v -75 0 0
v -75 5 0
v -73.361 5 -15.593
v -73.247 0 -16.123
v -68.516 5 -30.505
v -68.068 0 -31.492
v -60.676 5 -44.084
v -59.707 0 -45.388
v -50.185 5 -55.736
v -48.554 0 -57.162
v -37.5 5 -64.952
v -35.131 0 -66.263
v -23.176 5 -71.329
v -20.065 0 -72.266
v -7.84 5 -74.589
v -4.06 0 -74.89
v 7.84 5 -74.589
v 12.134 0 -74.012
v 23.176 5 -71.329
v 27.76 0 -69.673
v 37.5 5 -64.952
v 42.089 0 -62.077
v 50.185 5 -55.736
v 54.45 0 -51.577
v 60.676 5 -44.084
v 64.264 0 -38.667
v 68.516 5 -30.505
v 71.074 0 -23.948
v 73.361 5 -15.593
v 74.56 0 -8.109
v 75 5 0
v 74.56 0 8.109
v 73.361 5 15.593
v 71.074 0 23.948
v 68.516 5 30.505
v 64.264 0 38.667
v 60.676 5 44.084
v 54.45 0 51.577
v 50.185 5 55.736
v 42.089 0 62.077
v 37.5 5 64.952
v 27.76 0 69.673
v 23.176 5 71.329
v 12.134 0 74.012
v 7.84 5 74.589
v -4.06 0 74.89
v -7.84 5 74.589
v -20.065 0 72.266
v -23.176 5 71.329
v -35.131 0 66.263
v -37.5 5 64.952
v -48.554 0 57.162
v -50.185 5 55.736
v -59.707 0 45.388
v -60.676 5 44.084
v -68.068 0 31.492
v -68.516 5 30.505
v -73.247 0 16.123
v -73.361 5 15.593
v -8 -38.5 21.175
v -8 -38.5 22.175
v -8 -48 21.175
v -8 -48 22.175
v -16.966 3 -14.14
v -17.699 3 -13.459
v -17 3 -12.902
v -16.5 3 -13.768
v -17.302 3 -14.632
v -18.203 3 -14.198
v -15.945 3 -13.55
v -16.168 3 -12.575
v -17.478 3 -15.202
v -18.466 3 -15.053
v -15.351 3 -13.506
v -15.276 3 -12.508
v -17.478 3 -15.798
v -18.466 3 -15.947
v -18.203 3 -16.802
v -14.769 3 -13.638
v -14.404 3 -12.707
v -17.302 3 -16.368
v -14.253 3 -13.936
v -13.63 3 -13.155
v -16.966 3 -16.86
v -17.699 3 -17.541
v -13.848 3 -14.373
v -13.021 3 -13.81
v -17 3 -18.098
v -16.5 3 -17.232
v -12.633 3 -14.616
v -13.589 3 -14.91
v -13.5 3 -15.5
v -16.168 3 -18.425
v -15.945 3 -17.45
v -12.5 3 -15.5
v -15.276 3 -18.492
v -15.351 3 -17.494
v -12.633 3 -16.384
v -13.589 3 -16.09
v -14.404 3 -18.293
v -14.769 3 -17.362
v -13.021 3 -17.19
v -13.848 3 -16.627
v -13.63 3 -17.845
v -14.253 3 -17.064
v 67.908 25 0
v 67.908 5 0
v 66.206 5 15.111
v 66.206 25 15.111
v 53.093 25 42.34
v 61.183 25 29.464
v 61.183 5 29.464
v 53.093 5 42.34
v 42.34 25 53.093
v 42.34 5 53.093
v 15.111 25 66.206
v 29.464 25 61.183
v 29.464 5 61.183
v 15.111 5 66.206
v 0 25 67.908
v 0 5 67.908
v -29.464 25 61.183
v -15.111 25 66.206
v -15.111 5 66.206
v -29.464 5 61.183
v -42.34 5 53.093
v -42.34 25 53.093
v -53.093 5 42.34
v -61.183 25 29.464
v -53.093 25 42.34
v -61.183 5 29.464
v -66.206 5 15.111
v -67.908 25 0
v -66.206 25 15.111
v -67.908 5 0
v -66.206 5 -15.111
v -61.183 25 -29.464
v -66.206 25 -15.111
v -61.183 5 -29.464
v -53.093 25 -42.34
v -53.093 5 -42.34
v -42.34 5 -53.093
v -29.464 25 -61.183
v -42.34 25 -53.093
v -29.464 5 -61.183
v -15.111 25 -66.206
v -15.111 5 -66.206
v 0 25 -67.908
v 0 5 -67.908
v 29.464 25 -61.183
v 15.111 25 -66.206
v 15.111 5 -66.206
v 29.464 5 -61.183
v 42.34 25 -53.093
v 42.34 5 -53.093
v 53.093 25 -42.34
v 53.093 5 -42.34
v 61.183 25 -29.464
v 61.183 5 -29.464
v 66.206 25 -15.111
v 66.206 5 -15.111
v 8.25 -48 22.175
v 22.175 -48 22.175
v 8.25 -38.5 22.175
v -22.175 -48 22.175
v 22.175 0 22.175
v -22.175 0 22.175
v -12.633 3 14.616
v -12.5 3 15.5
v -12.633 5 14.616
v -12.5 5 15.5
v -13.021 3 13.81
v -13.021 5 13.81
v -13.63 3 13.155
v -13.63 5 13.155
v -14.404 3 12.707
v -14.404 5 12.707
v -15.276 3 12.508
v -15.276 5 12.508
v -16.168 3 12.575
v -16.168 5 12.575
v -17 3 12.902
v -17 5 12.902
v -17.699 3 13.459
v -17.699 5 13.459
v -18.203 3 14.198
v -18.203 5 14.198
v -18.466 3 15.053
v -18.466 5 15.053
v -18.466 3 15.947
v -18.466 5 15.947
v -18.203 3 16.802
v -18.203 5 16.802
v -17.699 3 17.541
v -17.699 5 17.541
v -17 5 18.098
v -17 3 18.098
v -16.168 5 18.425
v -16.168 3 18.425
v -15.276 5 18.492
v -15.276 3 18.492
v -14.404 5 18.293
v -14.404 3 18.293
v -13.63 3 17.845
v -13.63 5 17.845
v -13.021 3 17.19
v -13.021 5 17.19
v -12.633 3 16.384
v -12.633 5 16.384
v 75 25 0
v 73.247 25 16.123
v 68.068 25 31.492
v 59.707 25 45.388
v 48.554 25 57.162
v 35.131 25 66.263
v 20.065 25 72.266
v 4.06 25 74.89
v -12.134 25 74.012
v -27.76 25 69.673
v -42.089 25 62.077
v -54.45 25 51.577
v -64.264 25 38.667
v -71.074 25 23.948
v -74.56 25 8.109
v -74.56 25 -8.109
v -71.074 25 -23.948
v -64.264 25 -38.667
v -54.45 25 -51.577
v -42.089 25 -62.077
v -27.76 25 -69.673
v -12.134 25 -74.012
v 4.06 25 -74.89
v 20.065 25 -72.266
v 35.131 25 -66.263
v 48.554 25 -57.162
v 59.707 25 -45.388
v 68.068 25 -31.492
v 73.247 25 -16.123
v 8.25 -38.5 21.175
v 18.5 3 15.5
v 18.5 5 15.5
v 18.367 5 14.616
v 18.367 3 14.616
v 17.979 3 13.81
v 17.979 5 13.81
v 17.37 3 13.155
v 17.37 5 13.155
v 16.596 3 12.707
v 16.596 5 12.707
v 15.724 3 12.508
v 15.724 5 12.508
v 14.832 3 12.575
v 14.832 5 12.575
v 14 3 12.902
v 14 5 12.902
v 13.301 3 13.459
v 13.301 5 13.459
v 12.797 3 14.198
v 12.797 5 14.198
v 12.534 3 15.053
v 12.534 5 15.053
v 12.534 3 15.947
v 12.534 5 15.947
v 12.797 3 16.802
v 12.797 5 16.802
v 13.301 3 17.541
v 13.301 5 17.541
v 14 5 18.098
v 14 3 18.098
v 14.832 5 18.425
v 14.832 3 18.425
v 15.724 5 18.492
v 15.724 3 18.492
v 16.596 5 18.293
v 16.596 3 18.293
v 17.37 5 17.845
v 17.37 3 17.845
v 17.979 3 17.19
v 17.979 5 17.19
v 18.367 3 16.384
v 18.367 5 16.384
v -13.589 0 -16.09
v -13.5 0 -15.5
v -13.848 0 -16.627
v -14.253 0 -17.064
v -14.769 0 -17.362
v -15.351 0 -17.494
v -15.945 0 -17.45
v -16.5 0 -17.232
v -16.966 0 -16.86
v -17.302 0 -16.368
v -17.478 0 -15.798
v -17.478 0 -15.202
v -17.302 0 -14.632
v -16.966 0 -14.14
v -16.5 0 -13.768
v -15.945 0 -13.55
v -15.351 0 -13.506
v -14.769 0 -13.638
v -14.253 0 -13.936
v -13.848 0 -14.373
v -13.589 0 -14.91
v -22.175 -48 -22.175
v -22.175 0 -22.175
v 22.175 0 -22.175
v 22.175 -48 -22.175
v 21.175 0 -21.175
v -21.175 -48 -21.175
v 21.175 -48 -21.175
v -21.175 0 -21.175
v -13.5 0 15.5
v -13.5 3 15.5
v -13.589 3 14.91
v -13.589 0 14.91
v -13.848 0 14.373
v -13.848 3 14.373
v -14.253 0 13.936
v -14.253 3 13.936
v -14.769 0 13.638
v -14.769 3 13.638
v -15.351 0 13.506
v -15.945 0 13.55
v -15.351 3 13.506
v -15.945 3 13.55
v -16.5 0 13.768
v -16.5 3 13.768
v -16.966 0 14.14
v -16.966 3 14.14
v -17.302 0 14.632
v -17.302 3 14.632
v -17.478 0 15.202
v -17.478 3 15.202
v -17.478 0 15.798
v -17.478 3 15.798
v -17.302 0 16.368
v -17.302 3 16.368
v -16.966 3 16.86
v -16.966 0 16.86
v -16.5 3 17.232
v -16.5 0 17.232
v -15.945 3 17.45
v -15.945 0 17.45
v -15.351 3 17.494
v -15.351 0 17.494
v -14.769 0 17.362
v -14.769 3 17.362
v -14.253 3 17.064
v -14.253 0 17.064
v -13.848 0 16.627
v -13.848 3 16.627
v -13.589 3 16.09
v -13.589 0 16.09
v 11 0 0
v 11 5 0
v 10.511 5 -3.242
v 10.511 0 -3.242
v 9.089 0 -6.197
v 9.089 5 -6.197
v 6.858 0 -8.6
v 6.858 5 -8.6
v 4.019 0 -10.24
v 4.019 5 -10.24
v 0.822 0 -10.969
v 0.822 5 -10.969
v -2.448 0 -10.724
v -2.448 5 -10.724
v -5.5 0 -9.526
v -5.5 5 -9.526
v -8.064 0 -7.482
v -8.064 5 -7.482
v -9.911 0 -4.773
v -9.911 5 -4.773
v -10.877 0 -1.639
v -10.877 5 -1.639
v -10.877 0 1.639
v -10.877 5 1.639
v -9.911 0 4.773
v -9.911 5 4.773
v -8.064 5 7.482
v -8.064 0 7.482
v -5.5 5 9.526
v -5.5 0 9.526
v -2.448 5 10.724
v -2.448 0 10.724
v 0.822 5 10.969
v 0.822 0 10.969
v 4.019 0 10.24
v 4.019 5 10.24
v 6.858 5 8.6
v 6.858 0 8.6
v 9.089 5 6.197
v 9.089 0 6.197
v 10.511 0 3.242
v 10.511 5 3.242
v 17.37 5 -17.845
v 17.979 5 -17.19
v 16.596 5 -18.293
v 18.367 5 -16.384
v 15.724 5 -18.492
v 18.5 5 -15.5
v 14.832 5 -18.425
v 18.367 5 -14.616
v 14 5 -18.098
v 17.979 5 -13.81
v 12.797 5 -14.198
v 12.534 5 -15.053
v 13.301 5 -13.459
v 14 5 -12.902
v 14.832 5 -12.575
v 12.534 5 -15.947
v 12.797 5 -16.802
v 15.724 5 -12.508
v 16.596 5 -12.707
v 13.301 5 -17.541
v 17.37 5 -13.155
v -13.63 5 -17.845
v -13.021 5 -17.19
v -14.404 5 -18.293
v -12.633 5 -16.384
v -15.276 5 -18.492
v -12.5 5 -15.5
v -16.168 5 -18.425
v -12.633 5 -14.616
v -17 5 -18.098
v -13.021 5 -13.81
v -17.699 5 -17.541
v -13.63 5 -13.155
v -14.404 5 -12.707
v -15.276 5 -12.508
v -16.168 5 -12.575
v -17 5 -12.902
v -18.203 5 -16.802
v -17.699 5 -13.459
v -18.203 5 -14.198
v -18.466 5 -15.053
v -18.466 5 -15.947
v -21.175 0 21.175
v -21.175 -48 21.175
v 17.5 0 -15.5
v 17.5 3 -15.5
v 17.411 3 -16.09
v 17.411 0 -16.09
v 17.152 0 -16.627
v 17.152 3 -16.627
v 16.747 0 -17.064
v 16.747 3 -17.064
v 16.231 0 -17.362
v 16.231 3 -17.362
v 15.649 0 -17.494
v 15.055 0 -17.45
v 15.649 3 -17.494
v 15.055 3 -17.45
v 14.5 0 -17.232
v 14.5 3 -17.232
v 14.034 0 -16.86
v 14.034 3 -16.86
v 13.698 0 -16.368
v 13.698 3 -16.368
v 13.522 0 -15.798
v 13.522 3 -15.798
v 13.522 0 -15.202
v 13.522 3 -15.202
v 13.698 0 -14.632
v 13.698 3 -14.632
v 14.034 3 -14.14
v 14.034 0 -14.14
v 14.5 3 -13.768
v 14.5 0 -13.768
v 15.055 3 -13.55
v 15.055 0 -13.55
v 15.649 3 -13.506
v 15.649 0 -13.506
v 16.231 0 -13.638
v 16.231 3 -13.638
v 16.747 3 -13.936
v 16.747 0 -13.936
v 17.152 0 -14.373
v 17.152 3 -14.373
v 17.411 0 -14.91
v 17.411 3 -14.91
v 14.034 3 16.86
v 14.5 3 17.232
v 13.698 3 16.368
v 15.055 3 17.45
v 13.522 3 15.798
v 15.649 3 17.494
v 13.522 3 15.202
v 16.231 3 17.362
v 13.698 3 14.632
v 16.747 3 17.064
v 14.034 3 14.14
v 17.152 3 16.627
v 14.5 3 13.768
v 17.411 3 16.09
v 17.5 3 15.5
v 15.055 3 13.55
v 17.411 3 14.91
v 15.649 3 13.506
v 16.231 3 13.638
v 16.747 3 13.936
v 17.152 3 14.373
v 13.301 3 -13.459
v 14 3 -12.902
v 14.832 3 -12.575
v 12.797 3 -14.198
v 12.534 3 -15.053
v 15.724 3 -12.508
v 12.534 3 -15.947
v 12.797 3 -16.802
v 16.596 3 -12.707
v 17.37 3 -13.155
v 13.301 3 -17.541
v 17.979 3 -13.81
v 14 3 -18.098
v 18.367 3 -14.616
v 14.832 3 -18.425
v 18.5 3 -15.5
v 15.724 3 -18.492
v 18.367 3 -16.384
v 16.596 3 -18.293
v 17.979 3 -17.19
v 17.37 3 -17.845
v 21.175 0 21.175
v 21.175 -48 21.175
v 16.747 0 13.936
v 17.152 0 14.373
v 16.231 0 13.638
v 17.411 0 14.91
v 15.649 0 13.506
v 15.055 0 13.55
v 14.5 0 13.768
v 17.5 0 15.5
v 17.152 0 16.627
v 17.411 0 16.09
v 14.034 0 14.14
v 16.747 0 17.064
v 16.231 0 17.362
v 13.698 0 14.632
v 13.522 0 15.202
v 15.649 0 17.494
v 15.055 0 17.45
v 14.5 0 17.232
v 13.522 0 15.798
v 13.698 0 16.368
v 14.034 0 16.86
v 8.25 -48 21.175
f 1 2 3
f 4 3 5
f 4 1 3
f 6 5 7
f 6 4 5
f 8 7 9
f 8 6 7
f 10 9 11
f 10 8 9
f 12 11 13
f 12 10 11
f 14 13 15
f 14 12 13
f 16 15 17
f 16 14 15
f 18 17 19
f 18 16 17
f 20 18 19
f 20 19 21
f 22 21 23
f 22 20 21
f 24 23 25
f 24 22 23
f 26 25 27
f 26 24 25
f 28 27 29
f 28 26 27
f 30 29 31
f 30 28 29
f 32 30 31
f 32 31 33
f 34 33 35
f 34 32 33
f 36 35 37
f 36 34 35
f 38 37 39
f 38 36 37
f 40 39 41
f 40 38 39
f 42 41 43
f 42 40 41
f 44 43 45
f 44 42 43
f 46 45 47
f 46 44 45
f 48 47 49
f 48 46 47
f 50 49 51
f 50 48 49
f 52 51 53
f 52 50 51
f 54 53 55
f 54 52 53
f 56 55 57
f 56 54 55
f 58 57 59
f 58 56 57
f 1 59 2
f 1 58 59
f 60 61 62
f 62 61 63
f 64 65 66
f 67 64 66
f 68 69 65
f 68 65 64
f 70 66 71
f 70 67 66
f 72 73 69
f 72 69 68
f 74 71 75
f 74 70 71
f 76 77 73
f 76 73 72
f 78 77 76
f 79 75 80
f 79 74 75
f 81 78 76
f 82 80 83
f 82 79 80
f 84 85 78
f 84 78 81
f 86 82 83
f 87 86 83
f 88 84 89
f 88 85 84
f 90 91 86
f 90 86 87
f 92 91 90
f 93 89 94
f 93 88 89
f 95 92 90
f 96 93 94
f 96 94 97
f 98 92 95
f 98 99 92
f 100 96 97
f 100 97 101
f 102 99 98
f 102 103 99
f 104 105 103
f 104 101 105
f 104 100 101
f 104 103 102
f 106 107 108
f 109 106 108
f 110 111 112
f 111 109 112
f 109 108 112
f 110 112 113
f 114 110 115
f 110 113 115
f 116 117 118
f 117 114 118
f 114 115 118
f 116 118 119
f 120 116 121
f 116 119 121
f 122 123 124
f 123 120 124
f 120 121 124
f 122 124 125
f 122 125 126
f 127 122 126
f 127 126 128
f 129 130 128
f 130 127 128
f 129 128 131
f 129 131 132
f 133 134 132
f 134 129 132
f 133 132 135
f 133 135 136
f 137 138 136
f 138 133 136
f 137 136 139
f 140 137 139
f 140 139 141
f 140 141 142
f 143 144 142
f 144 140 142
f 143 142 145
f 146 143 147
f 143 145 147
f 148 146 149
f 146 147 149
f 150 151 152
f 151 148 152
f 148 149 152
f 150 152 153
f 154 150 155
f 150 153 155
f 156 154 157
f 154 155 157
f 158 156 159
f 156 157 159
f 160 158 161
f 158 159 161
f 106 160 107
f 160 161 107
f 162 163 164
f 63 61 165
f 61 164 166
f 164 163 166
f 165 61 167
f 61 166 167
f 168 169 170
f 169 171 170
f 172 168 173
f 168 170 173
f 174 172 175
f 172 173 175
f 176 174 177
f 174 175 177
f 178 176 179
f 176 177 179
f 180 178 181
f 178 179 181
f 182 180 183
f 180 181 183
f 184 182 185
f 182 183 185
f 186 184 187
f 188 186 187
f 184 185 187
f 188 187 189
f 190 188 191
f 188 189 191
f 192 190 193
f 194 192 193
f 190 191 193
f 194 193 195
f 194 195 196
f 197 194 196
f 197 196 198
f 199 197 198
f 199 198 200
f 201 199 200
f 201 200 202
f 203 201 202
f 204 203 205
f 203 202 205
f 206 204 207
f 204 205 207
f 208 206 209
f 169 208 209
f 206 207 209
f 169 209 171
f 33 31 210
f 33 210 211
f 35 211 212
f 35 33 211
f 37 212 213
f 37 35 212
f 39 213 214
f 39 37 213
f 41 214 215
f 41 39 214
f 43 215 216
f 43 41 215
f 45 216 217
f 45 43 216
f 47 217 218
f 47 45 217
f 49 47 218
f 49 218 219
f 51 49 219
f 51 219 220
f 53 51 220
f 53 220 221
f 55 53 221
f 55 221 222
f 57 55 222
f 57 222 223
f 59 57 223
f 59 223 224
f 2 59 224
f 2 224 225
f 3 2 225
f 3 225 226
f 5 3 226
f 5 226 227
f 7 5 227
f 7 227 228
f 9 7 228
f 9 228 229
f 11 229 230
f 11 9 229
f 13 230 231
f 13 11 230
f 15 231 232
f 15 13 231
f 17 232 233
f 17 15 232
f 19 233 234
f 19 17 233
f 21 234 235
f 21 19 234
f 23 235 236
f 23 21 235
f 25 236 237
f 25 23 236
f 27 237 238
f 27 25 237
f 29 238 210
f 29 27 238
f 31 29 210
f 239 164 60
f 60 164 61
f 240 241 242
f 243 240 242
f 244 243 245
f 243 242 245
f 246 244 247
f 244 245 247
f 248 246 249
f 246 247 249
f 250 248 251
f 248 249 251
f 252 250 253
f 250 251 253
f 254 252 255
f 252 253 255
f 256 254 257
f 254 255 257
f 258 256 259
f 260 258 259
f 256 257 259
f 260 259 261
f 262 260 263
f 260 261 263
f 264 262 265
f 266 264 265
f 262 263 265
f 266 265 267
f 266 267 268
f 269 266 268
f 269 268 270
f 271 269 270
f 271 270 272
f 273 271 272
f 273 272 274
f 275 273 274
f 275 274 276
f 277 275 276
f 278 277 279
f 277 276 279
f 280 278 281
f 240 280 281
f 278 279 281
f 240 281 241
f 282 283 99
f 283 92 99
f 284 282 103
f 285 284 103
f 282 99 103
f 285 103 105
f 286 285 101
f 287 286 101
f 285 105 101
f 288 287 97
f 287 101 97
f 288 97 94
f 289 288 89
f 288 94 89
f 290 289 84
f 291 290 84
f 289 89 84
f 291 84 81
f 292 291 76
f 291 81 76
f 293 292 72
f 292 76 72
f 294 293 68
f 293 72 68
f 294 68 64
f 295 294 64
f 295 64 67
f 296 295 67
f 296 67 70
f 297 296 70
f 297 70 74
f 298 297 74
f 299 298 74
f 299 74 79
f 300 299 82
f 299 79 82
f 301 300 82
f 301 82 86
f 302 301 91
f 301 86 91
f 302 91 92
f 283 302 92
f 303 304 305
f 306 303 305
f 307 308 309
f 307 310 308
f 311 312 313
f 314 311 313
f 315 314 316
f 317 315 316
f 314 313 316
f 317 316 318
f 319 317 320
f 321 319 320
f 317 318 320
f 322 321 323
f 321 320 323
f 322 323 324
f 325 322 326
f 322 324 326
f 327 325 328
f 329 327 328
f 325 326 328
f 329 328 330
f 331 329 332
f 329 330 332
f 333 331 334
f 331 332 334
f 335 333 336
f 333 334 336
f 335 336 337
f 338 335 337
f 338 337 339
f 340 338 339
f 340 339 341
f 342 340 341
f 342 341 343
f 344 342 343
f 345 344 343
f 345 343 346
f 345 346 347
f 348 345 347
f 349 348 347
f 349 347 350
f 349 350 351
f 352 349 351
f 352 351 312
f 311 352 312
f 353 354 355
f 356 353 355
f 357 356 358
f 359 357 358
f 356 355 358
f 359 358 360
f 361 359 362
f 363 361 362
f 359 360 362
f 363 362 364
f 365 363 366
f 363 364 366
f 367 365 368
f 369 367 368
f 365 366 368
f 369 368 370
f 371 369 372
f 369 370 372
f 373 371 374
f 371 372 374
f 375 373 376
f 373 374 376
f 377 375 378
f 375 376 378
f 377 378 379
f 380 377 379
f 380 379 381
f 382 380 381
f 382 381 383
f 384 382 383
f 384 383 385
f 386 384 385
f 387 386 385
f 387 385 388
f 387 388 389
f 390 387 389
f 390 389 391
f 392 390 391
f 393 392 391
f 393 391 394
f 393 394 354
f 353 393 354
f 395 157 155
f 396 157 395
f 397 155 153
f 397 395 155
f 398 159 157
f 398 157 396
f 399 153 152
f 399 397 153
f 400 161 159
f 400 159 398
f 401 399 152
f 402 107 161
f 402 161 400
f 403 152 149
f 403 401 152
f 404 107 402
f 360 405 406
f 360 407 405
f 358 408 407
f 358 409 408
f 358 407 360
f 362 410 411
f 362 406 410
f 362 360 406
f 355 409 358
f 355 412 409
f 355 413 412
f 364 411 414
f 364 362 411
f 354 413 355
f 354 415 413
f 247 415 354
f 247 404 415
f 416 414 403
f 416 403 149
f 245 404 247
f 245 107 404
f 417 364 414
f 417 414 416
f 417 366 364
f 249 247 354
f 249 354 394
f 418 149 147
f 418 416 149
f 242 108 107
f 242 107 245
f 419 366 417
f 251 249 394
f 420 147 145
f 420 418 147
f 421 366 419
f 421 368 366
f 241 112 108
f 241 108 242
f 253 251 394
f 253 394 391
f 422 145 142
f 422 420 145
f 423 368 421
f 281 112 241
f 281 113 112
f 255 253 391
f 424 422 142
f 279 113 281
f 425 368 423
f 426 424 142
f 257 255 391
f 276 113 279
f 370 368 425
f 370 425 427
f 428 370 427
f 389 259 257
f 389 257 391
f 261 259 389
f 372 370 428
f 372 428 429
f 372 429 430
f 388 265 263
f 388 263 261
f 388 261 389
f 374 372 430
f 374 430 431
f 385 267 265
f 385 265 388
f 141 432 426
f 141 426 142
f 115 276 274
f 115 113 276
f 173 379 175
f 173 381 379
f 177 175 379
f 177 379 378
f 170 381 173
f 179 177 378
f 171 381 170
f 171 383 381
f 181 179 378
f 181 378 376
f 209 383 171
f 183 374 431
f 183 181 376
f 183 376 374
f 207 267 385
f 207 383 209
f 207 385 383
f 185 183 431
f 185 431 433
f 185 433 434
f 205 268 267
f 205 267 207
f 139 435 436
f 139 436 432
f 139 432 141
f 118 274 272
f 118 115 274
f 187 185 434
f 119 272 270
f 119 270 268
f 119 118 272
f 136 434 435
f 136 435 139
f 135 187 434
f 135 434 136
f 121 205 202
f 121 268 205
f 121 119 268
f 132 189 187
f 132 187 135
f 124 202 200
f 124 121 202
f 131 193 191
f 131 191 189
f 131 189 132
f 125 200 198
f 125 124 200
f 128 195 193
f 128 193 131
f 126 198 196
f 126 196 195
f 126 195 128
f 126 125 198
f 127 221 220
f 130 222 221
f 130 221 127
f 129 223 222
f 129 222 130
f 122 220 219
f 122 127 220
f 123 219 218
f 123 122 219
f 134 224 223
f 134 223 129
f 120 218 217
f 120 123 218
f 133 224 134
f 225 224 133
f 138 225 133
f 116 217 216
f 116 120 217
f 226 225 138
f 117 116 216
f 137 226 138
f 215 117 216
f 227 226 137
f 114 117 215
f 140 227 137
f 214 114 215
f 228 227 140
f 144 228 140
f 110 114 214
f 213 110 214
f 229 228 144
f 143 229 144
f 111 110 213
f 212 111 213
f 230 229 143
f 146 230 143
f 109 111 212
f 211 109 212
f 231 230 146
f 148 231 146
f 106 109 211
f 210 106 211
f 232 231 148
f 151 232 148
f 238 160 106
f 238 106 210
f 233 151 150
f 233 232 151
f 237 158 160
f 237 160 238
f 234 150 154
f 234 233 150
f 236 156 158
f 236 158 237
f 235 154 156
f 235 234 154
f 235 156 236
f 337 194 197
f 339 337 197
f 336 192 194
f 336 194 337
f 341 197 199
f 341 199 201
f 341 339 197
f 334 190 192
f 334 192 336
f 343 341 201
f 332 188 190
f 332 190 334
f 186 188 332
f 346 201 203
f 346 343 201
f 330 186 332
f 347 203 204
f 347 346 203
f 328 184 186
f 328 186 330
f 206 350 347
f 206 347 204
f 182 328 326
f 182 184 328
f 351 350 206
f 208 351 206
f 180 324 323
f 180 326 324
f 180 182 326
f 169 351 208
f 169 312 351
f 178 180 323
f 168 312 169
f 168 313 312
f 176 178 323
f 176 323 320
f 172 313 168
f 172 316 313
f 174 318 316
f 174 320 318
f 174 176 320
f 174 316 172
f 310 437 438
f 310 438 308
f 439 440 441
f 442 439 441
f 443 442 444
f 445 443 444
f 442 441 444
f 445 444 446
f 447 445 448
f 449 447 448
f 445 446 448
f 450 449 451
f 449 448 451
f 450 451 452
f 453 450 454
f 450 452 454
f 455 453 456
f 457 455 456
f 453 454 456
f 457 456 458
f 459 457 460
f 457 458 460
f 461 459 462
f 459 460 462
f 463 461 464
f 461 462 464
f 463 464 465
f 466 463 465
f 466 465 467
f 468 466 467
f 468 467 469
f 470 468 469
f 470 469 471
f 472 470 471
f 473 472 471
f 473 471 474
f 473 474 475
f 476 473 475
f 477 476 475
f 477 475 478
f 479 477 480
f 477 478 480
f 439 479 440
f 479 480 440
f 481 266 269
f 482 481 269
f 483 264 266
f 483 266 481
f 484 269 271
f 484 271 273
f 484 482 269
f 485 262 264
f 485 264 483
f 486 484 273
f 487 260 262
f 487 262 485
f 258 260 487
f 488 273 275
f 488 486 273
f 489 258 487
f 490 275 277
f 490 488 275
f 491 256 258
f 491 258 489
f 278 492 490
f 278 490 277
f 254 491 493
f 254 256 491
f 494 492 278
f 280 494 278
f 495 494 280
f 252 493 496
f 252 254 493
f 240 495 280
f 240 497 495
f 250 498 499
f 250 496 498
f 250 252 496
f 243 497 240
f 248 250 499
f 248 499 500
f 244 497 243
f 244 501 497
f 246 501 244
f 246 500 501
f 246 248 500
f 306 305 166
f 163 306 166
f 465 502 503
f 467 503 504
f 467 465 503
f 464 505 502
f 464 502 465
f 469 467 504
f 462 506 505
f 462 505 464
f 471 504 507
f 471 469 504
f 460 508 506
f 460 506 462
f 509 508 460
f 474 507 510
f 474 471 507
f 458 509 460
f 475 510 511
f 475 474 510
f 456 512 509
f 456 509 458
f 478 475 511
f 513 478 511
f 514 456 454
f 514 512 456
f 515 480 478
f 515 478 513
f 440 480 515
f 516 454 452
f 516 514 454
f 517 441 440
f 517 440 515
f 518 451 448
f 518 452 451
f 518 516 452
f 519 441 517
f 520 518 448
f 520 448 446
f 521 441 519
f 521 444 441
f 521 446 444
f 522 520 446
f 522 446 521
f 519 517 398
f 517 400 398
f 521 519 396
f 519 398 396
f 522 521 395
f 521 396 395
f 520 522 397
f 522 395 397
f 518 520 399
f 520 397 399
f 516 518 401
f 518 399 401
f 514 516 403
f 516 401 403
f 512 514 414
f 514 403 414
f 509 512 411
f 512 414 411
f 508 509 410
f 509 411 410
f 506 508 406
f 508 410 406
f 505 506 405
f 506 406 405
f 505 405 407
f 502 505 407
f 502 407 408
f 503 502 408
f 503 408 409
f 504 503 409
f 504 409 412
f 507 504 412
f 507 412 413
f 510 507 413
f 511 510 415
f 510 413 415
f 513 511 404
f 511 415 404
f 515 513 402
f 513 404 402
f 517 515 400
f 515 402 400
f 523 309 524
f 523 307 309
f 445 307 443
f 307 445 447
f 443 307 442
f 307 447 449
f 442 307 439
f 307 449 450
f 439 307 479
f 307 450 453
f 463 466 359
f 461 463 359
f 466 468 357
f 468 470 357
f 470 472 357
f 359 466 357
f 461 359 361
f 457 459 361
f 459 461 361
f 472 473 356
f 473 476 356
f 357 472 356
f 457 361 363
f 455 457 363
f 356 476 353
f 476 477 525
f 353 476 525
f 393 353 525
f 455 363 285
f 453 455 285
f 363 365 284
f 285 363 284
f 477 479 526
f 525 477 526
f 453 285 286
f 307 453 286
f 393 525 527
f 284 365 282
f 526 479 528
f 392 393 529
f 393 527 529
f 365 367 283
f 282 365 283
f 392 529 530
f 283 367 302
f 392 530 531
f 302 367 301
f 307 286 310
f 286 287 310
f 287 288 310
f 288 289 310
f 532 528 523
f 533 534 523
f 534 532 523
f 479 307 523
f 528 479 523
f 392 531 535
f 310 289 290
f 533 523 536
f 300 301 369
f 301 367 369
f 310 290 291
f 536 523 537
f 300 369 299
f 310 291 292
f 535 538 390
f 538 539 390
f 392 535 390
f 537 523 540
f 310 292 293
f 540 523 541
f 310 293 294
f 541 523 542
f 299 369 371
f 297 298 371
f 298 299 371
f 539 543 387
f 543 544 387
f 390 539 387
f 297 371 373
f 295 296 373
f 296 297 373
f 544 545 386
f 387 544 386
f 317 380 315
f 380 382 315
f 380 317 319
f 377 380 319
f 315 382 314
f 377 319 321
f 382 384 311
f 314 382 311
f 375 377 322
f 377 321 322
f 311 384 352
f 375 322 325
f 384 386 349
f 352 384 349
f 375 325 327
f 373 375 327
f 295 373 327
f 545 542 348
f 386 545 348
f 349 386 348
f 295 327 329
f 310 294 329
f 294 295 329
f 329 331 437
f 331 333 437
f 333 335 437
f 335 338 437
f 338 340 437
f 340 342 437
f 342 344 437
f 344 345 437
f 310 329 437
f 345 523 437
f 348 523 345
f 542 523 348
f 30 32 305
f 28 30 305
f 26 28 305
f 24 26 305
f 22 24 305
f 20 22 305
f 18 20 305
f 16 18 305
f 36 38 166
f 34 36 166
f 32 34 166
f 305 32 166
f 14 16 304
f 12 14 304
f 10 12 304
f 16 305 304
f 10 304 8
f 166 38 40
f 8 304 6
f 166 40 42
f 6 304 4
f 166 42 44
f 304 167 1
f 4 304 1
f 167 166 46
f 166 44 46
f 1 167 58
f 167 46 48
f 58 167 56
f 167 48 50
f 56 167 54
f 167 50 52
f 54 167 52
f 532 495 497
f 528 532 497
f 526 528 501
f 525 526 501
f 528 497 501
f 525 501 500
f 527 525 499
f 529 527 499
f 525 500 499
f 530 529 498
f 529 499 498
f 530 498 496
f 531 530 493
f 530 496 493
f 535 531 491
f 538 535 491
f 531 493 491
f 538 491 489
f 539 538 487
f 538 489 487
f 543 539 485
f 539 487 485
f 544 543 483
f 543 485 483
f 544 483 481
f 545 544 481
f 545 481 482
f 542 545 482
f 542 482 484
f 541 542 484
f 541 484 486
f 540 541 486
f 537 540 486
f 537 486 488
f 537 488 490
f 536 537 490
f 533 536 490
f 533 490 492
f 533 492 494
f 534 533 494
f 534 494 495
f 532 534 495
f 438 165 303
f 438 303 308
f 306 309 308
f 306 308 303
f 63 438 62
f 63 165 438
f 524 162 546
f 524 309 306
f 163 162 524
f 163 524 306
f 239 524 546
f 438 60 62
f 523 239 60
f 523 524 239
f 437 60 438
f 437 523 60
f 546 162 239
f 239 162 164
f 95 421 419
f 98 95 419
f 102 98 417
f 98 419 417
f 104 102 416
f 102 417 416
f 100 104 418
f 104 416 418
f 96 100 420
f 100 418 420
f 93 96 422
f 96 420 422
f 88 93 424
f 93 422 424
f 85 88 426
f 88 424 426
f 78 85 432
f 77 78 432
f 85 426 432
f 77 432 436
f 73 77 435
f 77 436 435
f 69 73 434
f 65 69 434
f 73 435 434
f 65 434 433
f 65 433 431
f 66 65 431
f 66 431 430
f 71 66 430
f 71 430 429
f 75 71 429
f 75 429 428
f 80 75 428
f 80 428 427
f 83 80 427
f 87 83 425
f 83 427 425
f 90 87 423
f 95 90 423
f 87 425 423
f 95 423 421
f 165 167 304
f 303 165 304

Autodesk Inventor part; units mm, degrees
ref_plane "YZ Plane" through (0, 0, 0) normal (1, 0, 0) x (0, 1, 0)
ref_plane "XZ Plane" through (0, 0, 0) normal (0, 1, 0) x (-1, 0, 0)
ref_plane "XY Plane" through (0, 0, 0) normal (0, 0, 1) x (1, 0, 0)
sketch "Эскиз1" plane through (0, 0, 0) normal (0, 1, 0) x (-1, 0, 0)
  circle A0 centre (0, 0) radius 75
  dimension "d0" = 150
extrude "Выдавливание1" add sketch "Эскиз1" along normal blind 5
sketch "Эскиз2" plane through (0, 0, 0) normal (0, -1, 0) x (1, 0, 0)
  line L0 (21.175, 21.175) -> (-21.175, 21.175)
  line L1 (-21.175, 21.175) -> (-21.175, -21.175)
  line L2 (-21.175, -21.175) -> (21.175, -21.175)
  line L3 (21.175, -21.175) -> (21.175, 21.175)
  line L4 (21.175, 21.175) -> (-21.175, -21.175) construction
  line L5 (-21.175, 21.175) -> (21.175, -21.175) construction
  line L6 (22.175, 22.175) -> (-22.175, 22.175)
  line L7 (-22.175, 22.175) -> (-22.175, -22.175)
  line L8 (-22.175, -22.175) -> (22.175, -22.175)
  line L9 (22.175, -22.175) -> (22.175, 22.175)
  line L10 (22.175, 22.175) -> (-22.175, -22.175) construction
  line L11 (-22.175, 22.175) -> (22.175, -22.175) construction
  point P0 (0, 0)
  dimension "d3" = 42.35
  dimension "d4" = 42.35
  dimension "d5" = 44.35
  dimension "d6" = 44.35
extrude "Выдавливание2" add sketch "Эскиз2" along normal blind 48
sketch "Эскиз4" plane through (-22.175, 0, 22.175) normal (0, 0, 1) x (1, 0, 0)
  line L0 (0, 0) -> (0, -48)
  line L1 (22.175, -48) -> (30.425, -48)
  line L2 (30.425, -48) -> (30.425, -38.5)
  line L3 (30.425, -38.5) -> (14.175, -38.5)
  line L4 (14.175, -38.5) -> (14.175, -48)
  line L5 (22.175, -48) -> (14.175, -48)
  point P0 (22.175, 0)
  dimension "d9" = 22.175
  dimension "d10" = 8.25
  dimension "d11" = 9.5
  dimension "d12" = 16.25
extrude "Выдавливание3" cut sketch "Эскиз4" against normal blind 1
sketch "Эскиз5" plane through (0, 5, 0) normal (0, 1, 0) x (1, 0, 0)
  circle A0 centre (0, 0) radius 11
  line L0 (-15.5, -15.5) -> (15.5, -15.5)
  line L1 (15.5, -15.5) -> (15.5, 15.5)
  line L2 (15.5, 15.5) -> (-15.5, 15.5)
  line L3 (-15.5, 15.5) -> (-15.5, -15.5)
  line L4 (-15.5, -15.5) -> (15.5, 15.5) construction
  line L5 (15.5, -15.5) -> (-15.5, 15.5) construction
  circle A1 centre (15.5, 15.5) radius 2
  circle A2 centre (15.5, -15.5) radius 2
  circle A3 centre (-15.5, -15.5) radius 2
  circle A4 centre (-15.5, 15.5) radius 2
  dimension "d15" = 22
  dimension "d16" = 31
  dimension "d17" = 31
  dimension "d18" = 4
  dimension "d19" = 4
  dimension "d20" = 4
  dimension "d21" = 4
extrude "Выдавливание4" cut sketch "Эскиз5" against normal blind 5 contours A0 | L3 A3 L0 | L0 A3 L3 | A2 L1 L0 | L0 L1 A2 | A4 L2 L3 | L3 L2 A4 | A1 L2 L1 | L1 L2 A1
sketch "Эскиз6" plane through (0, 5, 0) normal (0, 1, 0) x (1, 0, 0)
  circle A0 centre (15.5, 15.5) radius 2 projected
  line L0 (-15.5, -15.5) -> (15.5, -15.5)
  line L1 (15.5, -15.5) -> (15.5, 15.5)
  line L2 (15.5, 15.5) -> (-15.5, 15.5)
  line L3 (-15.5, 15.5) -> (-15.5, -15.5)
  line L4 (-15.5, -15.5) -> (15.5, 15.5) construction
  line L5 (15.5, -15.5) -> (-15.5, 15.5) construction
  circle A1 centre (15.5, 15.5) radius 3
  circle A2 centre (15.5, -15.5) radius 3
  circle A3 centre (-15.5, -15.5) radius 2 projected
  circle A4 centre (-15.5, -15.5) radius 3
  circle A5 centre (-15.5, 15.5) radius 2 projected
  circle A6 centre (-15.5, 15.5) radius 3
  point P0 (0, 0)
  dimension "d24" = 6
  dimension "d25" = 6
  dimension "d26" = 6
  dimension "d27" = 6
extrude "Выдавливание5" cut sketch "Эскиз6" against normal blind 2 contours A0 L1 L2 | A0 L2 A1 L1 | L2 L1 A0 | A0 L1 A1 L2 | A6 L3 A5 L2 | L2 A5 L3 A6 | A2 L0 L1 | L1 L0 A2 | A5 L3 L2 | L2 L3 A5 | A4 L0 A3 L3 | L3 A3 L0 A4 | A3 L0 L3 | L3 L0 A3
sketch "Эскиз7" plane through (0, 5, 0) normal (0, 1, 0) x (1, 0, 0)
  circle A0 centre (0, 0) radius 67.9085
  circle A1 centre (0, 0) radius 75
  dimension "d30" = 135.817
  dimension "d31" = 150
extrude "Выдавливание6" add sketch "Эскиз7" along normal blind 20
properties part number "Основание"
